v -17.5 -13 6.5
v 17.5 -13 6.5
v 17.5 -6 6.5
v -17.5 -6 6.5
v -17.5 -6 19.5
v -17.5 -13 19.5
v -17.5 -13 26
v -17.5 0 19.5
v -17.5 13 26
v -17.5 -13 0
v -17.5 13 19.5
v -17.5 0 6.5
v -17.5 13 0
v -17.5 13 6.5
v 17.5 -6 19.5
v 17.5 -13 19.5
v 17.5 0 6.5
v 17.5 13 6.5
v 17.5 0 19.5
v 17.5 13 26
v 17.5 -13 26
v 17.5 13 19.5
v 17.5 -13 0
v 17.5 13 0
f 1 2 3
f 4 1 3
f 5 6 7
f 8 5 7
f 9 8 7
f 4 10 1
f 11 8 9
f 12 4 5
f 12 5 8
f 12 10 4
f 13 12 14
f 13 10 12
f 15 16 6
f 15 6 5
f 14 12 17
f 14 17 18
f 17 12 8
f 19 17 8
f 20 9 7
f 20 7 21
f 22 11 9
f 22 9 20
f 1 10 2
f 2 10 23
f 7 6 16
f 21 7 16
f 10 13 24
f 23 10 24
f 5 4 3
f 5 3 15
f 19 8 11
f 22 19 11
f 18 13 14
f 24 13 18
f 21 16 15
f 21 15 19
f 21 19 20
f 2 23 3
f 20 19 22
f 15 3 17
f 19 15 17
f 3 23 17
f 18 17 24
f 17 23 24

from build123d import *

# Parameters (mm, degrees)
SKETCH_1_W          = 35
SKETCH_1_H          = 26
EXTRUDE_1_DEPTH     = 26
SKETCH_3_W          = 13
SKETCH_3_H          = 13
SKETCH_3_H_2        = 7
CUT_EXTRUDE_1_DEPTH = 43


with BuildPart() as part:
    # 草圖1 → 填料-伸長1 (new body)
    with BuildSketch(Plane.XY):
        Rectangle(SKETCH_1_W, SKETCH_1_H)
    extrude(amount=EXTRUDE_1_DEPTH)

    # 草圖3 → 除料-伸長1 (cut)
    with BuildSketch(Plane.ZY.offset(17.5)):
        with Locations((13, 6.5)):
            Rectangle(SKETCH_3_W, SKETCH_3_H)
        with Locations((13, -9.5)):
            Rectangle(SKETCH_3_W, SKETCH_3_H_2)
    extrude(amount=-CUT_EXTRUDE_1_DEPTH, mode=Mode.SUBTRACT)


solid = part.part
